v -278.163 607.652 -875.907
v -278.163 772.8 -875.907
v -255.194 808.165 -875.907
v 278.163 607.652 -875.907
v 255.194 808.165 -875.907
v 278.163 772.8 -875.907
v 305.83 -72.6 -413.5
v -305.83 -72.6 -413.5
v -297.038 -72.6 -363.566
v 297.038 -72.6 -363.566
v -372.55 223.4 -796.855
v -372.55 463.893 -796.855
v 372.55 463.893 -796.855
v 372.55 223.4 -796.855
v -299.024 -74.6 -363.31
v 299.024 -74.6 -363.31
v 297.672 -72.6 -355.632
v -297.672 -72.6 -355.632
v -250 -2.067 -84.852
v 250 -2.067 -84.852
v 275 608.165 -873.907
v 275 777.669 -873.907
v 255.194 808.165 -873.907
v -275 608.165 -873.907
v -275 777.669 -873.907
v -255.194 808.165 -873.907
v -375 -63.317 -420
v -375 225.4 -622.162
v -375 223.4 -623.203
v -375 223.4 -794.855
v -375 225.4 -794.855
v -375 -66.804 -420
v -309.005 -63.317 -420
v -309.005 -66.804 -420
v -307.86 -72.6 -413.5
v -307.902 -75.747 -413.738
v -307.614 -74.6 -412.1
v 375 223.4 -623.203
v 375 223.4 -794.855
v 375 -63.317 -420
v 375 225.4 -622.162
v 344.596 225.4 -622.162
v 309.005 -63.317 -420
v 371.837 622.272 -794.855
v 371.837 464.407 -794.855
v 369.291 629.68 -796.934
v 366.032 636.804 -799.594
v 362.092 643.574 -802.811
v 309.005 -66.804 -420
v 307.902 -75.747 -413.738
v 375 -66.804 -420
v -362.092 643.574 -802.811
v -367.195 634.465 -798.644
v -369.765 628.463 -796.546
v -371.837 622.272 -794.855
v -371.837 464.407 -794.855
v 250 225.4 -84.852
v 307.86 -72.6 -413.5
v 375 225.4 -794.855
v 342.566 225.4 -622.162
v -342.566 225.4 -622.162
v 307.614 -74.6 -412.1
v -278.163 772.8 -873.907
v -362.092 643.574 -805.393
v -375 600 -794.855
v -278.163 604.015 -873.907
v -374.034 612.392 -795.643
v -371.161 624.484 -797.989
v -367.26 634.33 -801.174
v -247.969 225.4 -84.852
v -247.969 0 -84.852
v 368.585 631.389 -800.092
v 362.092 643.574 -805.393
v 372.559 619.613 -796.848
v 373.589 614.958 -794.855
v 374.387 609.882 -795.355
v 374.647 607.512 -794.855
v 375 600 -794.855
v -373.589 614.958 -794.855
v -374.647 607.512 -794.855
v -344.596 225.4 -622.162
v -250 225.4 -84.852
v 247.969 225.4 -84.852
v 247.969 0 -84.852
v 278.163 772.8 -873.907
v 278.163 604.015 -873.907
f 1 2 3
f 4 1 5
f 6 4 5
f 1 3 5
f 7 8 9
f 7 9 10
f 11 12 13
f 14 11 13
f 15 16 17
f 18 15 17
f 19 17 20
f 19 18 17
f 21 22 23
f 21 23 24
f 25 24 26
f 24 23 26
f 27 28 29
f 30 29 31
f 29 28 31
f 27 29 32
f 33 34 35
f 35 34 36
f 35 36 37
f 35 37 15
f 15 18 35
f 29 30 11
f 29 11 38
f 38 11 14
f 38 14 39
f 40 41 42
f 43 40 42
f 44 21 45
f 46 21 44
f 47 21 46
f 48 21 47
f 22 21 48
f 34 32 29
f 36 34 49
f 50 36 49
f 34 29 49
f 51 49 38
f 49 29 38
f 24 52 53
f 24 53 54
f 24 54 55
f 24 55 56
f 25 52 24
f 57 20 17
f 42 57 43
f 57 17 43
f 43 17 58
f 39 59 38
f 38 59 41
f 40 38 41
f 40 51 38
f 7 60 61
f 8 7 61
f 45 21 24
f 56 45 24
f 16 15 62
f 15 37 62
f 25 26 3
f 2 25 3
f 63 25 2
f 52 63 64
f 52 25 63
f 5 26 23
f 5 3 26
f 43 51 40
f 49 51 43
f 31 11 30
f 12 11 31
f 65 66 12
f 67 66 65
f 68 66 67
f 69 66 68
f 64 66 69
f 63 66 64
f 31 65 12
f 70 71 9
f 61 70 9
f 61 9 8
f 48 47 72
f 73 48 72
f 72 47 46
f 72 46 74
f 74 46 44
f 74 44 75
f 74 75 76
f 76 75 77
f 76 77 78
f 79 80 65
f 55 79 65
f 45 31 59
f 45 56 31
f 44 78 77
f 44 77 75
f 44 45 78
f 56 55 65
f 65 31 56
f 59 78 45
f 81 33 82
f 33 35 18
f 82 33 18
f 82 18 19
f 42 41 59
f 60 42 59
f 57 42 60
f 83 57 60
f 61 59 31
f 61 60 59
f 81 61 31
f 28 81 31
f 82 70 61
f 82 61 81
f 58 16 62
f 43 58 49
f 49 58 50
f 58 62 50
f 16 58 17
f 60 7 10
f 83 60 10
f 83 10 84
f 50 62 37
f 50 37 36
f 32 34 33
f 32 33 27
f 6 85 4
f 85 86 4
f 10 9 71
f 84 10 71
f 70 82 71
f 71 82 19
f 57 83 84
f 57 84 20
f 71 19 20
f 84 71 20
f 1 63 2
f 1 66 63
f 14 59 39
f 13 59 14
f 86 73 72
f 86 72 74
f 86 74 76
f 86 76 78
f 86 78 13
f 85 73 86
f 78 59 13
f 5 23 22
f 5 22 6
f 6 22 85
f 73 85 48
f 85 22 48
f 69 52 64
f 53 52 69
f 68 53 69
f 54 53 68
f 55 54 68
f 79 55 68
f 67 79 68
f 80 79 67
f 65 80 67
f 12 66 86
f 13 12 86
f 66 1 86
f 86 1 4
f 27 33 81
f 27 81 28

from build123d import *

# Parameters (mm, degrees)
SKETCH2_W                        = 750
SKETCH2_H                        = 2
CUT_EXTRUDE1_START               = -75.747152873
CUT_EXTRUDE1_DEPTH               = 12.429918895
BOSS_EXTRUDE8_DEPTH              = 2
BOSS_EXTRUDE9_REACH              = 1300.889
CUT_EXTRUDE2_DEPTH               = 1250.387389222
CUT_EXTRUDE2_DEPTH_BACK          = 1250.387389222
BOSS_EXTRUDE11_REACH             = 1244.792
CUT_EXTRUDE4_DEPTH               = 1243.792388557
CUT_EXTRUDE4_DEPTH_BACK          = 1243.792388557
SKETCH9_5_W                      = 96.83734937
SKETCH9_5_H                      = 2
CUT_EXTRUDE5_DEPTH               = 1250.387389222
CUT_EXTRUDE5_DEPTH_BACK          = 1250.387389222
BOSS_EXTRUDE12_REACH             = 1251.387
BOSS_EXTRUDE12_DIRECTION_2_REACH = 1251.387
CUT_EXTRUDE6_DEPTH               = 1250.387389222


# Read off the part's stored shape, not the designer's step: Cut-Extrude1
with BuildPart() as part:
    # Sweep1: sweep along a path in Sketch1
    with BuildLine(Plane(origin=(0, 0, 0), x_dir=(0, 0, -1), z_dir=(1, 0, 0))) as sweep1_path:
        Line((412.09972218, -74.6), (622.161983643, 225.4))
        Line((622.161983643, 225.4), (794.855002782, 225.4))
        Line((794.855002782, 225.4), (794.855002782, 464.406679147))
        Line((794.855002782, 464.406679147), (873.906828676, 608.165252796))
        Line((873.906828676, 608.165252796), (873.906828676, 808.165252796))
    # Sketch2 → Sweep1 (sweep)
    with BuildSketch(Plane(origin=(0, 808.165252796, -873.906828676), x_dir=(-1, 0, 0), z_dir=(0, -1, 0))):
        with Locations((0, 1)):
            Rectangle(SKETCH2_W, SKETCH2_H)
    sweep(path=sweep1_path.line, transition=Transition.RIGHT)

    # Cut-Extrude1 outline → Cut-Extrude1 (cut)
    with BuildSketch(Plane(origin=(0, 0, 0), x_dir=(1, 0, 0), z_dir=(0, 1, 0)).offset(CUT_EXTRUDE1_START)):
        Polygon((309.004636298, 420), (250, 84.852470497), (375, 84.852470497), (375, 420), align=None)
        Polygon((-375, 84.852470497), (-250, 84.852470497), (-309.004636298, 420), (-375, 420), align=None)
    extrude(amount=CUT_EXTRUDE1_DEPTH, mode=Mode.SUBTRACT)

    # Sketch5 → Boss-Extrude8 (add)
    with BuildSketch(Plane(origin=(0, -74.6, 0), x_dir=(1, 0, 0), z_dir=(0, 1, 0))):
        Polygon((250, 84.852470497), (307.902180066, 413.738026268), (-307.902180066, 413.738026268), (-250, 84.852470497), align=None)
    extrude(amount=BOSS_EXTRUDE8_DEPTH)

    # Boss-Extrude9: up to this face of the body (flat: up to its plane)
    boss_extrude9_end = Plane(part.part.faces().sort_by_distance((0, 225.4, -708.508493212))[0])
    # Sketch7 → Boss-Extrude9 (add, up to the picked face)
    with BuildSketch(Plane(origin=(0, -74.6, 0), x_dir=(1, 0, 0), z_dir=(0, 1, 0)), mode=Mode.PRIVATE) as boss_extrude9_sk1:
        Polygon((247.969240917, 84.852470497), (250, 84.852470497), (375, 794.855002782), (372.969240917, 794.855002782), align=None)
    boss_extrude9_tool1 = split(extrude(boss_extrude9_sk1.sketch, amount=BOSS_EXTRUDE9_REACH, mode=Mode.PRIVATE), bisect_by=boss_extrude9_end, keep=Keep.BOTH, mode=Mode.PRIVATE)
    # Sketch7 → Boss-Extrude9 (add, up to the picked face)
    with BuildSketch(Plane(origin=(0, -74.6, 0), x_dir=(1, 0, 0), z_dir=(0, 1, 0)), mode=Mode.PRIVATE) as boss_extrude9_sk2:
        Polygon((-250, 84.852470497), (-247.969240917, 84.852470497), (-372.969240917, 794.855002782), (-375, 794.855002782), align=None)
    boss_extrude9_tool2 = split(extrude(boss_extrude9_sk2.sketch, amount=BOSS_EXTRUDE9_REACH, mode=Mode.PRIVATE), bisect_by=boss_extrude9_end, keep=Keep.BOTH, mode=Mode.PRIVATE)
    add(boss_extrude9_tool1.solids().sort_by(Axis((311.48462, -74.6, -439.853737), (0, 1, 0)))[0])
    add(boss_extrude9_tool2.solids().sort_by(Axis((-311.48462, -74.6, -439.853737), (0, 1, 0)))[0])

    # Sketch8 → Cut-Extrude2 (cut, two sides: drawn at the far end of the back side and taken through both)
    with BuildSketch(Plane(origin=(0, 0, 0), x_dir=(0, 0, -1), z_dir=(1, 0, 0)).offset(-CUT_EXTRUDE2_DEPTH_BACK)):
        Polygon((794.855002782, -75.747152873), (413.738026268, -75.747152873), (623.203117744, 223.4), (794.855002782, 223.4), align=None)
    extrude(amount=CUT_EXTRUDE2_DEPTH + CUT_EXTRUDE2_DEPTH_BACK, mode=Mode.SUBTRACT)

    # Boss-Extrude11: up to this plane
    boss_extrude11_end = Plane(origin=(375, 608.747952644, -874.227251213), z_dir=(0, 0.48184672916330257, 0.8762555161564617))
    # Sketch9 → Boss-Extrude11 (add, up to the surface)
    with BuildSketch(Plane(origin=(0, 808.165252796, -873.906828676), x_dir=(-1, 0, 0), z_dir=(0, -1, 0)), mode=Mode.PRIVATE) as boss_extrude11_sk1:
        Polygon((278.16265063, 0), (375, -79.051825894), (371.837349371, -79.051825894), (275, 0), align=None)
    boss_extrude11_tool1 = split(extrude(boss_extrude11_sk1.sketch, amount=BOSS_EXTRUDE11_REACH, mode=Mode.PRIVATE), bisect_by=boss_extrude11_end, keep=Keep.BOTH, mode=Mode.PRIVATE)
    add(boss_extrude11_tool1.solids().sort_by_distance((-325, 808.165253, -834.380916))[0])
    # Sketch9 → Boss-Extrude11 (add, up to the surface)
    with BuildSketch(Plane(origin=(0, 808.165252796, -873.906828676), x_dir=(-1, 0, 0), z_dir=(0, -1, 0)), mode=Mode.PRIVATE) as boss_extrude11_sk2:
        Polygon((-278.16265063, 0), (-275, 0), (-371.837349371, -79.051825894), (-375, -79.051825894), align=None)
    boss_extrude11_tool2 = split(extrude(boss_extrude11_sk2.sketch, amount=BOSS_EXTRUDE11_REACH, mode=Mode.PRIVATE), bisect_by=boss_extrude11_end, keep=Keep.BOTH, mode=Mode.PRIVATE)
    add(boss_extrude11_tool2.solids().sort_by_distance((325, 808.165253, -834.380916))[0])

    # Sketch9<5> → Cut-Extrude4 (cut, two sides: drawn at the far end of the back side and taken through both)
    with BuildSketch(Plane(origin=(0, 808.165252796, -873.906828676), x_dir=(-1, 0, 0), z_dir=(0, -1, 0)).offset(-CUT_EXTRUDE4_DEPTH_BACK)):
        with Locations((326.581325315, 1)):
            Rectangle(SKETCH9_5_W, SKETCH9_5_H)
        Polygon((375, 0), (278.16265063, 0), (375, -79.051825894), align=None)
        with Locations((-326.581325315, 1)):
            Rectangle(SKETCH9_5_W, SKETCH9_5_H)
        Polygon((-278.16265063, 0), (-375, 0), (-375, -79.051825894), align=None)
    extrude(amount=CUT_EXTRUDE4_DEPTH + CUT_EXTRUDE4_DEPTH_BACK, mode=Mode.SUBTRACT)

    # Sketch10 → Cut-Extrude5 (cut, two sides: drawn at the far end of the back side and taken through both)
    with BuildSketch(Plane(origin=(0, 0, 0), x_dir=(0, 0, -1), z_dir=(1, 0, 0)).offset(-CUT_EXTRUDE5_DEPTH_BACK)):
        Polygon((363.31001592, -74.6), (84.852470497, -2.066737554), (84.852470497, -74.6), align=None)
    extrude(amount=CUT_EXTRUDE5_DEPTH + CUT_EXTRUDE5_DEPTH_BACK, mode=Mode.SUBTRACT)

    # Boss-Extrude12: up to this face of the body (flat: up to its plane)
    boss_extrude12_end = Plane(part.part.faces().sort_by_distance((290.698054418, 99.199933477, -316.018244063))[0])
    # Sketch10<3> → Boss-Extrude12 (add, up to the picked face)
    with BuildSketch(Plane(origin=(0, 0, 0), x_dir=(0, 0, -1), z_dir=(1, 0, 0)), mode=Mode.PRIVATE) as boss_extrude12_sk1:
        Polygon((371.244288377, -74.6), (84.852470497, 0), (84.852470497, -2.066737554), (363.31001592, -74.6), align=None)
    boss_extrude12_tool1 = split(extrude(boss_extrude12_sk1.sketch, amount=BOSS_EXTRUDE12_REACH, mode=Mode.PRIVATE), bisect_by=boss_extrude12_end, keep=Keep.BOTH, mode=Mode.PRIVATE)
    add(boss_extrude12_tool1.solids().sort_by(Axis((0, -37.814265, -226.074099), (1, 0, 0)))[0])

    # Boss-Extrude12 direction 2: up to this face of the body (flat: up to its plane)
    boss_extrude12_direction_2_end = Plane(part.part.faces().sort_by_distance((-290.698054418, 99.199933477, -316.018244063))[0])
    # Sketch10<3> → Boss-Extrude12 direction 2 (add, up to the picked face)
    with BuildSketch(Plane(origin=(0, 0, 0), x_dir=(0, 0, -1), z_dir=(1, 0, 0)), mode=Mode.PRIVATE) as boss_extrude12_direction_2_sk1:
        Polygon((371.244288377, -74.6), (84.852470497, 0), (84.852470497, -2.066737554), (363.31001592, -74.6), align=None)
    boss_extrude12_direction_2_tool1 = split(extrude(boss_extrude12_direction_2_sk1.sketch, amount=-BOSS_EXTRUDE12_DIRECTION_2_REACH, mode=Mode.PRIVATE), bisect_by=boss_extrude12_direction_2_end, keep=Keep.BOTH, mode=Mode.PRIVATE)
    add(boss_extrude12_direction_2_tool1.solids().sort_by(Axis((0, -37.814265, -226.074099), (-1, 0, 0)))[0])

    # Sketch11 → Cut-Extrude6 (cut, through all)
    with BuildSketch(Plane.XY):
        with BuildLine():
            Line((-132.091535468, 997.705769529), (-362.091535468, 643.574371694))
            ThreePointArc((-362.091535468, 643.574371694), (-371.70502864, 622.723084766), (-375, 600))
            Line((-375, 600), (-375, 997.705769529))
            Line((-375, 997.705769529), (-132.091535468, 997.705769529))
        make_face()
        with BuildLine():
            Line((132.091535468, 997.705769529), (362.091535468, 643.574371694))
            ThreePointArc((362.091535468, 643.574371694), (371.70502864, 622.723084766), (375, 600))
            Line((375, 600), (375, 997.705769529))
            Line((375, 997.705769529), (132.091535468, 997.705769529))
        make_face()
    extrude(amount=-CUT_EXTRUDE6_DEPTH, mode=Mode.SUBTRACT)


solid = part.part
